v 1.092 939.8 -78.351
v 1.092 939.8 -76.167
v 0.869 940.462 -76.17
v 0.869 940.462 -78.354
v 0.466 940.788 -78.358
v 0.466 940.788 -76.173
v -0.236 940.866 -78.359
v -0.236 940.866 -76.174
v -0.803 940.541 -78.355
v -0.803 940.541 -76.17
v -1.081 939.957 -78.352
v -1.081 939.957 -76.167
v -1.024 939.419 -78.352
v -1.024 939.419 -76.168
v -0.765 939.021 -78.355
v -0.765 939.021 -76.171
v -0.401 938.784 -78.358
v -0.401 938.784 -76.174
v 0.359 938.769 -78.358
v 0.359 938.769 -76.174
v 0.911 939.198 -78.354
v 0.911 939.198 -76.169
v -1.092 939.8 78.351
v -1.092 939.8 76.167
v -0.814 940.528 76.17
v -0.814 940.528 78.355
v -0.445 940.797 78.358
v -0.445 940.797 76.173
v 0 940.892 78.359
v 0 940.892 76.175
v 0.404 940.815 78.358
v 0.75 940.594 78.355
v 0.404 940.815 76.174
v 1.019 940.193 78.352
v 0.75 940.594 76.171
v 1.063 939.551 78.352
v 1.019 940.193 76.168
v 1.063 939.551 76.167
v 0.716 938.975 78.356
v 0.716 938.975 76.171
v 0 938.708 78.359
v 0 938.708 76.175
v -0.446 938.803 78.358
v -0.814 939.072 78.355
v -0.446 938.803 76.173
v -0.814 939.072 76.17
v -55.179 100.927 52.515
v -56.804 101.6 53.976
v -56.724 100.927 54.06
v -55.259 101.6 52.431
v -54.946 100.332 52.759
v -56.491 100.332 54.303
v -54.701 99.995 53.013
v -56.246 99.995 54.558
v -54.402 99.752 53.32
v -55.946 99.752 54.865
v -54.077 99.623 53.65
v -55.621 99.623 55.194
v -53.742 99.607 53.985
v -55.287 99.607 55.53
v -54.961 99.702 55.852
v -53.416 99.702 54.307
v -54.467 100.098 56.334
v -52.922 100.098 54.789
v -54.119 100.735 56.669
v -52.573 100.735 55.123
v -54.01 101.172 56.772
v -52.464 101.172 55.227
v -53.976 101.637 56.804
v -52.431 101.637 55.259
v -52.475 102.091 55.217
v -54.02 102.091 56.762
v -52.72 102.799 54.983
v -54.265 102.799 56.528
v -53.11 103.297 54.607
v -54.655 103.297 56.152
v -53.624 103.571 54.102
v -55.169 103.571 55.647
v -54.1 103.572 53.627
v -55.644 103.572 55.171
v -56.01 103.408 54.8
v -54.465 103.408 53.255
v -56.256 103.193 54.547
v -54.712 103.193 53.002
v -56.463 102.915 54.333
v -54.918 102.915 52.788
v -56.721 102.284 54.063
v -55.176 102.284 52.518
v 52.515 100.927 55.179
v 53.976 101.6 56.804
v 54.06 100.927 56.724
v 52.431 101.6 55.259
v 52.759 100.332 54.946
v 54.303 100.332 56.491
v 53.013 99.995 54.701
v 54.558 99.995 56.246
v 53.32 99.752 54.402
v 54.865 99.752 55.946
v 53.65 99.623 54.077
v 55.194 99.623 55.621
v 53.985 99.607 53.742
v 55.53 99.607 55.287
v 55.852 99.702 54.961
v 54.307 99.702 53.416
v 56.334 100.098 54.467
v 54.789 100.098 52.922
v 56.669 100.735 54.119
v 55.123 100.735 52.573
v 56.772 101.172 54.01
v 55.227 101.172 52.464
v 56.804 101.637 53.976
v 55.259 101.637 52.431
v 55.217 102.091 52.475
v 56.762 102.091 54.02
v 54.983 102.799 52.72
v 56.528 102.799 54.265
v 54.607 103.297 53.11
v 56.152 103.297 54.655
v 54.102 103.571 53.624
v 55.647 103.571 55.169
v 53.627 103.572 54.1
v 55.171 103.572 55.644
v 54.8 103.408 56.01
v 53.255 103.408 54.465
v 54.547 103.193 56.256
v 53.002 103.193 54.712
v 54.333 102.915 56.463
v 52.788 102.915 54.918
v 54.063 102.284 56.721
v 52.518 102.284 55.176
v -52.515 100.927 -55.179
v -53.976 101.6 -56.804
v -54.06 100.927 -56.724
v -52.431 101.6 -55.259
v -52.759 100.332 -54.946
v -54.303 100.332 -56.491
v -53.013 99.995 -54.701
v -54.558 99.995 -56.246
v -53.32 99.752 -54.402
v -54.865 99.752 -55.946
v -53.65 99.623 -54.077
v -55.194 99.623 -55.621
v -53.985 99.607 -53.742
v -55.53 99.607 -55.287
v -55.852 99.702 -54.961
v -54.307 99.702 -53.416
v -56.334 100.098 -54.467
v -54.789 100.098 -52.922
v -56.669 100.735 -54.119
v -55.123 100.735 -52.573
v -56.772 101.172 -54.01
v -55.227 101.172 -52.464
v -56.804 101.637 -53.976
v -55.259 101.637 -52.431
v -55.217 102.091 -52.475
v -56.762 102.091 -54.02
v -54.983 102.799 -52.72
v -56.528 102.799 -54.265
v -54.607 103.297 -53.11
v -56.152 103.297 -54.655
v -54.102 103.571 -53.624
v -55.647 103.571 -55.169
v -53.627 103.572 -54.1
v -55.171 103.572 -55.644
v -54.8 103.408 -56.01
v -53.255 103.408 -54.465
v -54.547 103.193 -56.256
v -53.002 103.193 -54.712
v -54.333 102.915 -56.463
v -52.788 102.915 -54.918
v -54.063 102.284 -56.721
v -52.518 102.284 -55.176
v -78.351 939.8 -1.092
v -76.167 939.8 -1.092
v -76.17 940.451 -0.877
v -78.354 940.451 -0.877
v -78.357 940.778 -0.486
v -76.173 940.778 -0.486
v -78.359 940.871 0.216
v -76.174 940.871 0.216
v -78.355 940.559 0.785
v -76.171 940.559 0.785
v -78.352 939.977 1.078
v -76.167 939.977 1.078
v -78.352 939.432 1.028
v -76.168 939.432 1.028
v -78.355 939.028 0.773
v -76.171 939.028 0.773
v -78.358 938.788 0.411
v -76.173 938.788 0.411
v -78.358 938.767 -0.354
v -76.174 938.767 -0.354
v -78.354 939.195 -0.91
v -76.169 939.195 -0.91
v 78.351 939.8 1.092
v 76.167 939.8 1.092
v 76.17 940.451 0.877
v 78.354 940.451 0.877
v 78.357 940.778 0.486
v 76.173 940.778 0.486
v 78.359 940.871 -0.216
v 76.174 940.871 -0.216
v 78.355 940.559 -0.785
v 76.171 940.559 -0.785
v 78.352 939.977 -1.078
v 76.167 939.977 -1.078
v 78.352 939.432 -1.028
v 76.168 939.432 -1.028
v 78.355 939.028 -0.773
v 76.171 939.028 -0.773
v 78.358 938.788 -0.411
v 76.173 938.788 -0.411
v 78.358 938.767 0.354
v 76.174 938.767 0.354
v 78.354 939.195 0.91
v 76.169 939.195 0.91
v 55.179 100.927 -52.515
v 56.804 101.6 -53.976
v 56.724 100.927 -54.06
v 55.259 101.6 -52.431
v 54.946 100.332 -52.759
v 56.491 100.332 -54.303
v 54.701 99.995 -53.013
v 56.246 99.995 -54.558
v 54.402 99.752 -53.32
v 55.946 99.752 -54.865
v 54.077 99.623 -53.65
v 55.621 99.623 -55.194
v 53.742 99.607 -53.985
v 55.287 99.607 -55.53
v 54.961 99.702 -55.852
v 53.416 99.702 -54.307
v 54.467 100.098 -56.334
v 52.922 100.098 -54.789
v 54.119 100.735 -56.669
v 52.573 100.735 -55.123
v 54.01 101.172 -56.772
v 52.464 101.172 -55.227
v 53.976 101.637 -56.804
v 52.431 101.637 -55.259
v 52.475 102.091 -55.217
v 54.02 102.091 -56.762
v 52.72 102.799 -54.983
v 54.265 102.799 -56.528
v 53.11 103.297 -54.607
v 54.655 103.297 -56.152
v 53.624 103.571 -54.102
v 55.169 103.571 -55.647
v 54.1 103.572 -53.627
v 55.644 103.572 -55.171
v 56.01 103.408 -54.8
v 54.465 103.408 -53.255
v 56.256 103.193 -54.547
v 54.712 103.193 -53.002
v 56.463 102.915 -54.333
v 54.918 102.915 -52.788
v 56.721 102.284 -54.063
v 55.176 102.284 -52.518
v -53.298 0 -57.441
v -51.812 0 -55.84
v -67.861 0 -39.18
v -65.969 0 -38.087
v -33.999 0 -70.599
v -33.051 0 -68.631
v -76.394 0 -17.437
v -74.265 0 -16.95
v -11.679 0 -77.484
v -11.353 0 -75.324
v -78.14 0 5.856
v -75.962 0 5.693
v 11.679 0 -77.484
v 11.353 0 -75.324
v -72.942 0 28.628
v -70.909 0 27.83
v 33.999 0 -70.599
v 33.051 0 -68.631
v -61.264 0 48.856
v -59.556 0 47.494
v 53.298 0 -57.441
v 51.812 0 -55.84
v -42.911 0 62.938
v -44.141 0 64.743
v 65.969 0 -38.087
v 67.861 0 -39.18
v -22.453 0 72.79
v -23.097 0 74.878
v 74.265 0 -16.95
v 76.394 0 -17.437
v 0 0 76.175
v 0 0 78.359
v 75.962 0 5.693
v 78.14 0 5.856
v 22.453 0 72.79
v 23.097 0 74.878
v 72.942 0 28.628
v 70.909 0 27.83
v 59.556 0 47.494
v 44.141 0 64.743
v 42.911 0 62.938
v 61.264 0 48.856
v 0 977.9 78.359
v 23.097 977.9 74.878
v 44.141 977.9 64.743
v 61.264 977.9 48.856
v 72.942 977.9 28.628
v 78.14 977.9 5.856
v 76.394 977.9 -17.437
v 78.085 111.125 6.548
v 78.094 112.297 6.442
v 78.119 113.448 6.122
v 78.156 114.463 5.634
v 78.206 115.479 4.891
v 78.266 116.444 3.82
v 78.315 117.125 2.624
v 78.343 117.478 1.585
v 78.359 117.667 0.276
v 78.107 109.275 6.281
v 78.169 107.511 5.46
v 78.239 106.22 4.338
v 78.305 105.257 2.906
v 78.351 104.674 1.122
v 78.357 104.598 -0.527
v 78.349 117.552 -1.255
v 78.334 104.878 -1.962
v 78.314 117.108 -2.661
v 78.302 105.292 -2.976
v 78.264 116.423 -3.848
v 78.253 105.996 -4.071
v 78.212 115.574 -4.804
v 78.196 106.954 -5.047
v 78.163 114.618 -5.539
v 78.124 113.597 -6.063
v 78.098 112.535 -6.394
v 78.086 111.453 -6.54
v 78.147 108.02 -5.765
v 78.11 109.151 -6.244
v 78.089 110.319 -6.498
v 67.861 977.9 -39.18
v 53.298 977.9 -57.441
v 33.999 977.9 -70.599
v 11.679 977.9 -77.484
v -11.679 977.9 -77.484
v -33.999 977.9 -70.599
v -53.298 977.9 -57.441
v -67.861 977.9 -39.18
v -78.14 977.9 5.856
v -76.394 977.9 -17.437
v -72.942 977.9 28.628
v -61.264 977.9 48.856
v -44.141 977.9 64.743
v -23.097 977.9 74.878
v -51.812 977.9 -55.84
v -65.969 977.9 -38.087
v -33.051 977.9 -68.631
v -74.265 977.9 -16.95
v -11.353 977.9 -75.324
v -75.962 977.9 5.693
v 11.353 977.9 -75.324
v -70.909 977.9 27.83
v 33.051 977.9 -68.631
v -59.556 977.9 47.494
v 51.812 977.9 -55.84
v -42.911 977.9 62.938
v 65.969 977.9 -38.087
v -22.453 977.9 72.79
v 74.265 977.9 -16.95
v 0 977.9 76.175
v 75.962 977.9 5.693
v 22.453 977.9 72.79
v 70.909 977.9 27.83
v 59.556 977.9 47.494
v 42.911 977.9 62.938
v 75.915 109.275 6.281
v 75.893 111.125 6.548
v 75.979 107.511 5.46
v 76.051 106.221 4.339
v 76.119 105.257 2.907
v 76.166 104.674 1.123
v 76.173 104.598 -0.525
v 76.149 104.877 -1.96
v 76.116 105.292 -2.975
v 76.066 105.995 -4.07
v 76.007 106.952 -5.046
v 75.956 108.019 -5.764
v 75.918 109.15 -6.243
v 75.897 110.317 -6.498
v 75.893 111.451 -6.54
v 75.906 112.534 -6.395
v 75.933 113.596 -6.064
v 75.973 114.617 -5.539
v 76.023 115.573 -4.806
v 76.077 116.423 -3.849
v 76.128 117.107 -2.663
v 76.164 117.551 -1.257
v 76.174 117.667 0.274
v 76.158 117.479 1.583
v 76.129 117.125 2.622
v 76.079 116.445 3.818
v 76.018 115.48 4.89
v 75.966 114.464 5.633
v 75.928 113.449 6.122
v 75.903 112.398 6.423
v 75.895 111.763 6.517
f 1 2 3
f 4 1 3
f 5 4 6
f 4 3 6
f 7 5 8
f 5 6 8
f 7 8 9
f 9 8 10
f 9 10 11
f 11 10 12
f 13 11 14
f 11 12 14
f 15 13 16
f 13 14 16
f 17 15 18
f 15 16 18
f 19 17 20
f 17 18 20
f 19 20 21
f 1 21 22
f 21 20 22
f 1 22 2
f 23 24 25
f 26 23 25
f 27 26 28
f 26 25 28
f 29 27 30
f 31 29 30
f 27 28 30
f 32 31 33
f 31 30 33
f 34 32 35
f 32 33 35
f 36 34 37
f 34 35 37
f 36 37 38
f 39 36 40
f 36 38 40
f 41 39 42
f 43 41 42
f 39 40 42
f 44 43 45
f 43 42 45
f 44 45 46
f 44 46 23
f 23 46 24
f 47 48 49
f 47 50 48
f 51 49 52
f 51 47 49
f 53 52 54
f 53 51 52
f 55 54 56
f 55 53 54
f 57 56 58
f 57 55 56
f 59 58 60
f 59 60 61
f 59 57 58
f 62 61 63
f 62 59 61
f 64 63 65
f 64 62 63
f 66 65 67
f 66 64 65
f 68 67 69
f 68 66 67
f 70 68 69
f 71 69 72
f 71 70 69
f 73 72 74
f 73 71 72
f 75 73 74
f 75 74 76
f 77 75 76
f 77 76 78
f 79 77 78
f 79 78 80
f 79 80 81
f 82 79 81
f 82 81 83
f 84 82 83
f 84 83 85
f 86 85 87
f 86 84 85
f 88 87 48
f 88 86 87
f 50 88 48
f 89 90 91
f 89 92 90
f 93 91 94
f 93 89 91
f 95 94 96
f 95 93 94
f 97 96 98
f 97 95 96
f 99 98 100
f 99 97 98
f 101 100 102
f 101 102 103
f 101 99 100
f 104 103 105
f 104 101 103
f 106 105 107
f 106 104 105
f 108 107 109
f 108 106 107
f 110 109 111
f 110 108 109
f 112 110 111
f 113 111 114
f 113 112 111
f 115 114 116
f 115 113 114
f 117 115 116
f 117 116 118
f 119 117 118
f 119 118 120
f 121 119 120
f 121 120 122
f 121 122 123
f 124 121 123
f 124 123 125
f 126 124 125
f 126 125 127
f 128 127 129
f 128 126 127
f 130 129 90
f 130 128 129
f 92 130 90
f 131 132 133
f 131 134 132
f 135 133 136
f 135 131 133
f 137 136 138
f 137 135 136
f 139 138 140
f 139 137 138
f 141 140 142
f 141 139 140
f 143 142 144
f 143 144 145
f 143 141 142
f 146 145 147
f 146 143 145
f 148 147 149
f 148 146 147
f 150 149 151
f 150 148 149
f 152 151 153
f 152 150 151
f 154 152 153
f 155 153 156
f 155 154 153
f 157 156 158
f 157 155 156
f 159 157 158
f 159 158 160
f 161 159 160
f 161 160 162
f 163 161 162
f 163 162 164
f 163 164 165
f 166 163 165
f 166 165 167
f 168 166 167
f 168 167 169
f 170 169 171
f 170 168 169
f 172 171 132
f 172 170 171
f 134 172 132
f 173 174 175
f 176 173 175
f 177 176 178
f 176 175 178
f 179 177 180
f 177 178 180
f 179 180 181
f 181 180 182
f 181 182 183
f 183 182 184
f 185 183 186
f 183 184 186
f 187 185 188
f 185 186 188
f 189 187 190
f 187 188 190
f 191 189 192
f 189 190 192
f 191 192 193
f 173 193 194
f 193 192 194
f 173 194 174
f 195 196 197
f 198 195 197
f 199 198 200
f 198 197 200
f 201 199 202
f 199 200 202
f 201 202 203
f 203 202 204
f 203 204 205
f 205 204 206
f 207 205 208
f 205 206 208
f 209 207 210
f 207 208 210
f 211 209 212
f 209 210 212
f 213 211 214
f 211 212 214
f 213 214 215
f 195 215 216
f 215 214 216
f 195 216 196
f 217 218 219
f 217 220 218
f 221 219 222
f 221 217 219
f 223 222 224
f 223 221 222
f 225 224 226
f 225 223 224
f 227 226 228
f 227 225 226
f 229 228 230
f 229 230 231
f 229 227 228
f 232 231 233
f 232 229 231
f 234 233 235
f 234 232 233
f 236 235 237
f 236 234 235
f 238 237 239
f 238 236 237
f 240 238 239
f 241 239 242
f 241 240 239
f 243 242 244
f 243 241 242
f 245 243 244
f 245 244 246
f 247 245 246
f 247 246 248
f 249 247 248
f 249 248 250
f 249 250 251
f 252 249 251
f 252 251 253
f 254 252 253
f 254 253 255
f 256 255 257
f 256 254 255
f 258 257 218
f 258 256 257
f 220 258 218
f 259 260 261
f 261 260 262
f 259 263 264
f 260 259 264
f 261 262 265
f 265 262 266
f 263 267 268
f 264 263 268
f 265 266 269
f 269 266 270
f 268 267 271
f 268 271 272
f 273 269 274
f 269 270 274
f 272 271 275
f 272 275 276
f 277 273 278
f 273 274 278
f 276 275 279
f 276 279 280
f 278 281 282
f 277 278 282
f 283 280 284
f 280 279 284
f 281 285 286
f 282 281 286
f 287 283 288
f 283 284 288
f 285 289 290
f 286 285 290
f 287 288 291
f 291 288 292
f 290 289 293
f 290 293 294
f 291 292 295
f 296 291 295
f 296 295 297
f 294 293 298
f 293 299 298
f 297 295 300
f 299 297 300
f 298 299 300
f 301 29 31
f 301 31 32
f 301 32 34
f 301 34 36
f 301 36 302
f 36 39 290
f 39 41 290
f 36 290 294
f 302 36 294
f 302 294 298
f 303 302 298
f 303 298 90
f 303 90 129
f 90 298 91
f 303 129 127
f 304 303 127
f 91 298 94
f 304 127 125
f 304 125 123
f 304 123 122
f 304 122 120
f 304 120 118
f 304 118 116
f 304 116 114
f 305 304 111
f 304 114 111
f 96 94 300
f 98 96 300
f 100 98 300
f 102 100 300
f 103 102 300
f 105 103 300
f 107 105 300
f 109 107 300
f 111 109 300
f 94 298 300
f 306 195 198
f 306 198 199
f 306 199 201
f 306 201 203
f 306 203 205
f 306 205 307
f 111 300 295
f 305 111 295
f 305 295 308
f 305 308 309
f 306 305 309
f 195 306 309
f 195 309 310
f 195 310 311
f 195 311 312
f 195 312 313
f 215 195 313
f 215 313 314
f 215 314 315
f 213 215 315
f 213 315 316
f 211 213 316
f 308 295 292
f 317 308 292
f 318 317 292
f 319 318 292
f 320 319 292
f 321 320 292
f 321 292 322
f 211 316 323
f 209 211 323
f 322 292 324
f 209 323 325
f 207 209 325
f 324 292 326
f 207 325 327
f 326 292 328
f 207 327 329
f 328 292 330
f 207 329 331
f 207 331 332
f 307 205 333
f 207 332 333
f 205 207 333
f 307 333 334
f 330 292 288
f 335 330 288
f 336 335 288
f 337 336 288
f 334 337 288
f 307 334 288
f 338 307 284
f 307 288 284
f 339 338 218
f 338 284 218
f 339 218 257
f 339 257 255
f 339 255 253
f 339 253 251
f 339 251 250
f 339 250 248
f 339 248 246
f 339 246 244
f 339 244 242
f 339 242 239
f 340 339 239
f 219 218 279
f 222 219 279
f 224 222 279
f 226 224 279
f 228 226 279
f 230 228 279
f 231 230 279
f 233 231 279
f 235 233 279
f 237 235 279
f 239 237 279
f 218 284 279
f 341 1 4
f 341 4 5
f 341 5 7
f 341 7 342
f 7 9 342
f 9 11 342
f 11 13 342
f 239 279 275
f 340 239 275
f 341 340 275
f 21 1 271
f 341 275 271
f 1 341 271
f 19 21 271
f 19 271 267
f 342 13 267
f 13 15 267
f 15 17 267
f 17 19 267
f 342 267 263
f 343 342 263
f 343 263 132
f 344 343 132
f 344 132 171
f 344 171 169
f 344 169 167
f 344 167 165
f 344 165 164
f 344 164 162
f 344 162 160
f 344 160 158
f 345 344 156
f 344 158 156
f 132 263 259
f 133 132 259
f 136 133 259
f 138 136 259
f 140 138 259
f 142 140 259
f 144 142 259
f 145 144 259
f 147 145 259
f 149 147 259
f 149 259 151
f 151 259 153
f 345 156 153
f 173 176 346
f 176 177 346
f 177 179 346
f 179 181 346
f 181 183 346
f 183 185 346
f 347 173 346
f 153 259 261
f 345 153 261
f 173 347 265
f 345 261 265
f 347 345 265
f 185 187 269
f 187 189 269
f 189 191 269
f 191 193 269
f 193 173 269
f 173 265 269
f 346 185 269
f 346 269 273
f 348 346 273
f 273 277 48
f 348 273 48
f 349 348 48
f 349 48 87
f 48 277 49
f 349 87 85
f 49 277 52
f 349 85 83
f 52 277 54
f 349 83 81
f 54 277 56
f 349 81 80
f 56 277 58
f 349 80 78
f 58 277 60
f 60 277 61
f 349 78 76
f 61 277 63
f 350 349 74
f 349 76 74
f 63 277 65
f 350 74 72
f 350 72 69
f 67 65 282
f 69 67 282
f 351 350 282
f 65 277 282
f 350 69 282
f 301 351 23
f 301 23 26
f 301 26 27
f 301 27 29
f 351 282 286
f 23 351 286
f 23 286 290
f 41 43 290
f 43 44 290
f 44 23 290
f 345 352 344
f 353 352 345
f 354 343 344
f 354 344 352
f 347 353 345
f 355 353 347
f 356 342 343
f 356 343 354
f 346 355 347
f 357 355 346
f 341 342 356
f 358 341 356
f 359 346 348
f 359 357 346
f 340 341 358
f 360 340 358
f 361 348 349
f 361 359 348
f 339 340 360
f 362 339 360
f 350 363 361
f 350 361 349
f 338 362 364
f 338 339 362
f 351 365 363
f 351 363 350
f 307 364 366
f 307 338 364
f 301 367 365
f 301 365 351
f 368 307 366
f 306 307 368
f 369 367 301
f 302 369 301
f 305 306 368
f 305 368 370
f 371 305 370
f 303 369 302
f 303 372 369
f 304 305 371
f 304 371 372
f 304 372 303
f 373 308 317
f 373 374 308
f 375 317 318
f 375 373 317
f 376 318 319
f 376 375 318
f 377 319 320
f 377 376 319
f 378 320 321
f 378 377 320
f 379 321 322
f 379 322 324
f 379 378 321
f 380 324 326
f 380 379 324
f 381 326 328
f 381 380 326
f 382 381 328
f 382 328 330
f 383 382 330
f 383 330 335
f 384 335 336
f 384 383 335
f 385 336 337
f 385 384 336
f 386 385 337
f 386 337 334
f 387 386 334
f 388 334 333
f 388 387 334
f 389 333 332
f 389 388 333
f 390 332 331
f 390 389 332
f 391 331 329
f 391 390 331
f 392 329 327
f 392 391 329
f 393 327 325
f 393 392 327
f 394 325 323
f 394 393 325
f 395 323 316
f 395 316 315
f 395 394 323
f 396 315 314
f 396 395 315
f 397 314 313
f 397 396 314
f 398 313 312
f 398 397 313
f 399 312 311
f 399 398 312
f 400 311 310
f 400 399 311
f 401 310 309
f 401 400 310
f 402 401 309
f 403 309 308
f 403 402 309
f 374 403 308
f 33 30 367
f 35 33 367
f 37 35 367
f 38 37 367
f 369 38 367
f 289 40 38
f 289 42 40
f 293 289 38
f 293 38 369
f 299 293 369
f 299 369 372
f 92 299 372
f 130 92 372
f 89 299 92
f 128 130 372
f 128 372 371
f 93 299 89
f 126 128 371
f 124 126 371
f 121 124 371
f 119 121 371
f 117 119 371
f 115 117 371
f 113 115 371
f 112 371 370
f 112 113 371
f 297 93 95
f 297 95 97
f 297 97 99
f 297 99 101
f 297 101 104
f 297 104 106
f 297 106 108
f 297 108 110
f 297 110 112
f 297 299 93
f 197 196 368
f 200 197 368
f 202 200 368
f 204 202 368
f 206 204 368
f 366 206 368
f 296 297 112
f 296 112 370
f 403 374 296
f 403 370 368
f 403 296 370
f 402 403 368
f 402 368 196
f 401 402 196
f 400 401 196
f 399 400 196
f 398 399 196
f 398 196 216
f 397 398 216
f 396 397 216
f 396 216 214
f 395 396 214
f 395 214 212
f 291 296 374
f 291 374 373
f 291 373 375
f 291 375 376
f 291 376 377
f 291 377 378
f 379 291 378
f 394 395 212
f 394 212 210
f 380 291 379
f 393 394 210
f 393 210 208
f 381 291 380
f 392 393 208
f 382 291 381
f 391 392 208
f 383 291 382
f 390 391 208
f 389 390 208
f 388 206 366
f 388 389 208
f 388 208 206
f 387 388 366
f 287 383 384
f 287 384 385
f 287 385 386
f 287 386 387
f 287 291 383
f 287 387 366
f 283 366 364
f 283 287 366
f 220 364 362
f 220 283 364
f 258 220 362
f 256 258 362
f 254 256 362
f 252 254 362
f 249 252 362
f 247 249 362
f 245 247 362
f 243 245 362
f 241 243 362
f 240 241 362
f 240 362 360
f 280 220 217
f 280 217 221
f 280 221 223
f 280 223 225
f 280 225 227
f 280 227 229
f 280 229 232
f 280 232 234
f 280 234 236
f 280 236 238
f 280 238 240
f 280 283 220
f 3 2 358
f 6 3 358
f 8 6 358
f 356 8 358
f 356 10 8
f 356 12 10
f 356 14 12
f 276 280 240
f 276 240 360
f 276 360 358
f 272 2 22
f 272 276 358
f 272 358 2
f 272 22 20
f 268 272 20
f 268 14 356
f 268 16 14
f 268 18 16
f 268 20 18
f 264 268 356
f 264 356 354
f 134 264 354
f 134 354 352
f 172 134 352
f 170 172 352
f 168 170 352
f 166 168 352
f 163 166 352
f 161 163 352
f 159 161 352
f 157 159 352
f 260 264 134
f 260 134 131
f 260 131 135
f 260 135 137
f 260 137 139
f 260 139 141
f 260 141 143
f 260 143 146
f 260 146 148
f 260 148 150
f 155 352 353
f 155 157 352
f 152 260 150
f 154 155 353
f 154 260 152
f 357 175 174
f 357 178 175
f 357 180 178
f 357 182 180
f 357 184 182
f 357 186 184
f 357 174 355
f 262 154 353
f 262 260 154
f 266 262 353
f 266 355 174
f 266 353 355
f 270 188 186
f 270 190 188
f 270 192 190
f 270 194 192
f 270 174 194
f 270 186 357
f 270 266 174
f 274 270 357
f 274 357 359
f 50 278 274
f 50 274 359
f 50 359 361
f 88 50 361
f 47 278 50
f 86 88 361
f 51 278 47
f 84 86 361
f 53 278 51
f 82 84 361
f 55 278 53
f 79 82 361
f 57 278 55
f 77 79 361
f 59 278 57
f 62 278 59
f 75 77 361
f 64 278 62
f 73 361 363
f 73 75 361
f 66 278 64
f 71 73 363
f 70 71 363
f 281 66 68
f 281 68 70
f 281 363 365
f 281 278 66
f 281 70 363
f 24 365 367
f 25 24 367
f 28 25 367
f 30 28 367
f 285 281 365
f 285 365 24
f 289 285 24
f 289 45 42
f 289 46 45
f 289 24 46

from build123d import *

# Parameters (mm, degrees)
SKETCH1_R           = 78.359
SKETCH1_R_2         = 76.1746
BOSS_EXTRUDE1_DEPTH = 977.9
SKETCH2_R           = 1.0922
CUT_EXTRUDE1_DEPTH  = 985.158867136
CIRPATTERN1_COUNT   = 4
CIRPATTERN2_COUNT   = 4


with BuildPart() as part:
    # Sketch1 → Boss-Extrude1 (new body)
    with BuildSketch(Plane(origin=(0, 0, 0), x_dir=(1, 0, 0), z_dir=(0, 1, 0))):
        Circle(SKETCH1_R)
        Circle(SKETCH1_R_2, mode=Mode.SUBTRACT)
    extrude(amount=BOSS_EXTRUDE1_DEPTH)

    # Sketch2 → Cut-Extrude1 (cut, through all)
    with BuildSketch(Plane(origin=(0, 0, 0), x_dir=(0, 0, -1), z_dir=(1, 0, 0))):
        with Locations((0, 939.8)):
            Circle(SKETCH2_R)
    cut_extrude1 = extrude(amount=-CUT_EXTRUDE1_DEPTH, mode=Mode.SUBTRACT)

    # CirPattern1: Cut-Extrude1 ×4 about axis
    cirpattern1_axis = Axis((0, 977.9, 0), (0, 1, 0))
    for i in range(1, CIRPATTERN1_COUNT):
        add(cut_extrude1.rotate(cirpattern1_axis, i * 360 / CIRPATTERN1_COUNT), mode=Mode.SUBTRACT)

    # Sketch4 → 1/2 Clearance Hole1 (revolve, cut)
    with BuildSketch(Plane.ZX.offset(111.125)):
        Polygon((0, 0), (0, 92.834507437), (6.54812, 88.9), (6.54812, 0), align=None)
    revolve(axis=Axis((-6.35, 111.125, 0), (1, 0, 0)), mode=Mode.SUBTRACT)

    # Sketch6 → Ø4.0 (4) Diameter Hole1 (revolve, cut)
    with BuildSketch(Plane(origin=(0, 101.6, 0), x_dir=(0.7071067811865488, 0, -0.7071067811865464), z_dir=(0, 1, 0))):
        Polygon((0, 0), (0, 90.101721238), (2, 88.9), (2, 0), align=None)
    f_4_0_4_diameter_hole1 = revolve(axis=Axis((4.490128061, 101.6, 4.490128061), (-0.7071067811865464, 0, -0.7071067811865487)), mode=Mode.SUBTRACT)

    # CirPattern2: Ø4.0 (4) Diameter Hole1 ×4 about axis
    cirpattern2_axis = Axis((0, 0, 0), (0, 1, 0))
    for i in range(1, CIRPATTERN2_COUNT):
        add(f_4_0_4_diameter_hole1.rotate(cirpattern2_axis, i * 360 / CIRPATTERN2_COUNT), mode=Mode.SUBTRACT)


solid = part.part
